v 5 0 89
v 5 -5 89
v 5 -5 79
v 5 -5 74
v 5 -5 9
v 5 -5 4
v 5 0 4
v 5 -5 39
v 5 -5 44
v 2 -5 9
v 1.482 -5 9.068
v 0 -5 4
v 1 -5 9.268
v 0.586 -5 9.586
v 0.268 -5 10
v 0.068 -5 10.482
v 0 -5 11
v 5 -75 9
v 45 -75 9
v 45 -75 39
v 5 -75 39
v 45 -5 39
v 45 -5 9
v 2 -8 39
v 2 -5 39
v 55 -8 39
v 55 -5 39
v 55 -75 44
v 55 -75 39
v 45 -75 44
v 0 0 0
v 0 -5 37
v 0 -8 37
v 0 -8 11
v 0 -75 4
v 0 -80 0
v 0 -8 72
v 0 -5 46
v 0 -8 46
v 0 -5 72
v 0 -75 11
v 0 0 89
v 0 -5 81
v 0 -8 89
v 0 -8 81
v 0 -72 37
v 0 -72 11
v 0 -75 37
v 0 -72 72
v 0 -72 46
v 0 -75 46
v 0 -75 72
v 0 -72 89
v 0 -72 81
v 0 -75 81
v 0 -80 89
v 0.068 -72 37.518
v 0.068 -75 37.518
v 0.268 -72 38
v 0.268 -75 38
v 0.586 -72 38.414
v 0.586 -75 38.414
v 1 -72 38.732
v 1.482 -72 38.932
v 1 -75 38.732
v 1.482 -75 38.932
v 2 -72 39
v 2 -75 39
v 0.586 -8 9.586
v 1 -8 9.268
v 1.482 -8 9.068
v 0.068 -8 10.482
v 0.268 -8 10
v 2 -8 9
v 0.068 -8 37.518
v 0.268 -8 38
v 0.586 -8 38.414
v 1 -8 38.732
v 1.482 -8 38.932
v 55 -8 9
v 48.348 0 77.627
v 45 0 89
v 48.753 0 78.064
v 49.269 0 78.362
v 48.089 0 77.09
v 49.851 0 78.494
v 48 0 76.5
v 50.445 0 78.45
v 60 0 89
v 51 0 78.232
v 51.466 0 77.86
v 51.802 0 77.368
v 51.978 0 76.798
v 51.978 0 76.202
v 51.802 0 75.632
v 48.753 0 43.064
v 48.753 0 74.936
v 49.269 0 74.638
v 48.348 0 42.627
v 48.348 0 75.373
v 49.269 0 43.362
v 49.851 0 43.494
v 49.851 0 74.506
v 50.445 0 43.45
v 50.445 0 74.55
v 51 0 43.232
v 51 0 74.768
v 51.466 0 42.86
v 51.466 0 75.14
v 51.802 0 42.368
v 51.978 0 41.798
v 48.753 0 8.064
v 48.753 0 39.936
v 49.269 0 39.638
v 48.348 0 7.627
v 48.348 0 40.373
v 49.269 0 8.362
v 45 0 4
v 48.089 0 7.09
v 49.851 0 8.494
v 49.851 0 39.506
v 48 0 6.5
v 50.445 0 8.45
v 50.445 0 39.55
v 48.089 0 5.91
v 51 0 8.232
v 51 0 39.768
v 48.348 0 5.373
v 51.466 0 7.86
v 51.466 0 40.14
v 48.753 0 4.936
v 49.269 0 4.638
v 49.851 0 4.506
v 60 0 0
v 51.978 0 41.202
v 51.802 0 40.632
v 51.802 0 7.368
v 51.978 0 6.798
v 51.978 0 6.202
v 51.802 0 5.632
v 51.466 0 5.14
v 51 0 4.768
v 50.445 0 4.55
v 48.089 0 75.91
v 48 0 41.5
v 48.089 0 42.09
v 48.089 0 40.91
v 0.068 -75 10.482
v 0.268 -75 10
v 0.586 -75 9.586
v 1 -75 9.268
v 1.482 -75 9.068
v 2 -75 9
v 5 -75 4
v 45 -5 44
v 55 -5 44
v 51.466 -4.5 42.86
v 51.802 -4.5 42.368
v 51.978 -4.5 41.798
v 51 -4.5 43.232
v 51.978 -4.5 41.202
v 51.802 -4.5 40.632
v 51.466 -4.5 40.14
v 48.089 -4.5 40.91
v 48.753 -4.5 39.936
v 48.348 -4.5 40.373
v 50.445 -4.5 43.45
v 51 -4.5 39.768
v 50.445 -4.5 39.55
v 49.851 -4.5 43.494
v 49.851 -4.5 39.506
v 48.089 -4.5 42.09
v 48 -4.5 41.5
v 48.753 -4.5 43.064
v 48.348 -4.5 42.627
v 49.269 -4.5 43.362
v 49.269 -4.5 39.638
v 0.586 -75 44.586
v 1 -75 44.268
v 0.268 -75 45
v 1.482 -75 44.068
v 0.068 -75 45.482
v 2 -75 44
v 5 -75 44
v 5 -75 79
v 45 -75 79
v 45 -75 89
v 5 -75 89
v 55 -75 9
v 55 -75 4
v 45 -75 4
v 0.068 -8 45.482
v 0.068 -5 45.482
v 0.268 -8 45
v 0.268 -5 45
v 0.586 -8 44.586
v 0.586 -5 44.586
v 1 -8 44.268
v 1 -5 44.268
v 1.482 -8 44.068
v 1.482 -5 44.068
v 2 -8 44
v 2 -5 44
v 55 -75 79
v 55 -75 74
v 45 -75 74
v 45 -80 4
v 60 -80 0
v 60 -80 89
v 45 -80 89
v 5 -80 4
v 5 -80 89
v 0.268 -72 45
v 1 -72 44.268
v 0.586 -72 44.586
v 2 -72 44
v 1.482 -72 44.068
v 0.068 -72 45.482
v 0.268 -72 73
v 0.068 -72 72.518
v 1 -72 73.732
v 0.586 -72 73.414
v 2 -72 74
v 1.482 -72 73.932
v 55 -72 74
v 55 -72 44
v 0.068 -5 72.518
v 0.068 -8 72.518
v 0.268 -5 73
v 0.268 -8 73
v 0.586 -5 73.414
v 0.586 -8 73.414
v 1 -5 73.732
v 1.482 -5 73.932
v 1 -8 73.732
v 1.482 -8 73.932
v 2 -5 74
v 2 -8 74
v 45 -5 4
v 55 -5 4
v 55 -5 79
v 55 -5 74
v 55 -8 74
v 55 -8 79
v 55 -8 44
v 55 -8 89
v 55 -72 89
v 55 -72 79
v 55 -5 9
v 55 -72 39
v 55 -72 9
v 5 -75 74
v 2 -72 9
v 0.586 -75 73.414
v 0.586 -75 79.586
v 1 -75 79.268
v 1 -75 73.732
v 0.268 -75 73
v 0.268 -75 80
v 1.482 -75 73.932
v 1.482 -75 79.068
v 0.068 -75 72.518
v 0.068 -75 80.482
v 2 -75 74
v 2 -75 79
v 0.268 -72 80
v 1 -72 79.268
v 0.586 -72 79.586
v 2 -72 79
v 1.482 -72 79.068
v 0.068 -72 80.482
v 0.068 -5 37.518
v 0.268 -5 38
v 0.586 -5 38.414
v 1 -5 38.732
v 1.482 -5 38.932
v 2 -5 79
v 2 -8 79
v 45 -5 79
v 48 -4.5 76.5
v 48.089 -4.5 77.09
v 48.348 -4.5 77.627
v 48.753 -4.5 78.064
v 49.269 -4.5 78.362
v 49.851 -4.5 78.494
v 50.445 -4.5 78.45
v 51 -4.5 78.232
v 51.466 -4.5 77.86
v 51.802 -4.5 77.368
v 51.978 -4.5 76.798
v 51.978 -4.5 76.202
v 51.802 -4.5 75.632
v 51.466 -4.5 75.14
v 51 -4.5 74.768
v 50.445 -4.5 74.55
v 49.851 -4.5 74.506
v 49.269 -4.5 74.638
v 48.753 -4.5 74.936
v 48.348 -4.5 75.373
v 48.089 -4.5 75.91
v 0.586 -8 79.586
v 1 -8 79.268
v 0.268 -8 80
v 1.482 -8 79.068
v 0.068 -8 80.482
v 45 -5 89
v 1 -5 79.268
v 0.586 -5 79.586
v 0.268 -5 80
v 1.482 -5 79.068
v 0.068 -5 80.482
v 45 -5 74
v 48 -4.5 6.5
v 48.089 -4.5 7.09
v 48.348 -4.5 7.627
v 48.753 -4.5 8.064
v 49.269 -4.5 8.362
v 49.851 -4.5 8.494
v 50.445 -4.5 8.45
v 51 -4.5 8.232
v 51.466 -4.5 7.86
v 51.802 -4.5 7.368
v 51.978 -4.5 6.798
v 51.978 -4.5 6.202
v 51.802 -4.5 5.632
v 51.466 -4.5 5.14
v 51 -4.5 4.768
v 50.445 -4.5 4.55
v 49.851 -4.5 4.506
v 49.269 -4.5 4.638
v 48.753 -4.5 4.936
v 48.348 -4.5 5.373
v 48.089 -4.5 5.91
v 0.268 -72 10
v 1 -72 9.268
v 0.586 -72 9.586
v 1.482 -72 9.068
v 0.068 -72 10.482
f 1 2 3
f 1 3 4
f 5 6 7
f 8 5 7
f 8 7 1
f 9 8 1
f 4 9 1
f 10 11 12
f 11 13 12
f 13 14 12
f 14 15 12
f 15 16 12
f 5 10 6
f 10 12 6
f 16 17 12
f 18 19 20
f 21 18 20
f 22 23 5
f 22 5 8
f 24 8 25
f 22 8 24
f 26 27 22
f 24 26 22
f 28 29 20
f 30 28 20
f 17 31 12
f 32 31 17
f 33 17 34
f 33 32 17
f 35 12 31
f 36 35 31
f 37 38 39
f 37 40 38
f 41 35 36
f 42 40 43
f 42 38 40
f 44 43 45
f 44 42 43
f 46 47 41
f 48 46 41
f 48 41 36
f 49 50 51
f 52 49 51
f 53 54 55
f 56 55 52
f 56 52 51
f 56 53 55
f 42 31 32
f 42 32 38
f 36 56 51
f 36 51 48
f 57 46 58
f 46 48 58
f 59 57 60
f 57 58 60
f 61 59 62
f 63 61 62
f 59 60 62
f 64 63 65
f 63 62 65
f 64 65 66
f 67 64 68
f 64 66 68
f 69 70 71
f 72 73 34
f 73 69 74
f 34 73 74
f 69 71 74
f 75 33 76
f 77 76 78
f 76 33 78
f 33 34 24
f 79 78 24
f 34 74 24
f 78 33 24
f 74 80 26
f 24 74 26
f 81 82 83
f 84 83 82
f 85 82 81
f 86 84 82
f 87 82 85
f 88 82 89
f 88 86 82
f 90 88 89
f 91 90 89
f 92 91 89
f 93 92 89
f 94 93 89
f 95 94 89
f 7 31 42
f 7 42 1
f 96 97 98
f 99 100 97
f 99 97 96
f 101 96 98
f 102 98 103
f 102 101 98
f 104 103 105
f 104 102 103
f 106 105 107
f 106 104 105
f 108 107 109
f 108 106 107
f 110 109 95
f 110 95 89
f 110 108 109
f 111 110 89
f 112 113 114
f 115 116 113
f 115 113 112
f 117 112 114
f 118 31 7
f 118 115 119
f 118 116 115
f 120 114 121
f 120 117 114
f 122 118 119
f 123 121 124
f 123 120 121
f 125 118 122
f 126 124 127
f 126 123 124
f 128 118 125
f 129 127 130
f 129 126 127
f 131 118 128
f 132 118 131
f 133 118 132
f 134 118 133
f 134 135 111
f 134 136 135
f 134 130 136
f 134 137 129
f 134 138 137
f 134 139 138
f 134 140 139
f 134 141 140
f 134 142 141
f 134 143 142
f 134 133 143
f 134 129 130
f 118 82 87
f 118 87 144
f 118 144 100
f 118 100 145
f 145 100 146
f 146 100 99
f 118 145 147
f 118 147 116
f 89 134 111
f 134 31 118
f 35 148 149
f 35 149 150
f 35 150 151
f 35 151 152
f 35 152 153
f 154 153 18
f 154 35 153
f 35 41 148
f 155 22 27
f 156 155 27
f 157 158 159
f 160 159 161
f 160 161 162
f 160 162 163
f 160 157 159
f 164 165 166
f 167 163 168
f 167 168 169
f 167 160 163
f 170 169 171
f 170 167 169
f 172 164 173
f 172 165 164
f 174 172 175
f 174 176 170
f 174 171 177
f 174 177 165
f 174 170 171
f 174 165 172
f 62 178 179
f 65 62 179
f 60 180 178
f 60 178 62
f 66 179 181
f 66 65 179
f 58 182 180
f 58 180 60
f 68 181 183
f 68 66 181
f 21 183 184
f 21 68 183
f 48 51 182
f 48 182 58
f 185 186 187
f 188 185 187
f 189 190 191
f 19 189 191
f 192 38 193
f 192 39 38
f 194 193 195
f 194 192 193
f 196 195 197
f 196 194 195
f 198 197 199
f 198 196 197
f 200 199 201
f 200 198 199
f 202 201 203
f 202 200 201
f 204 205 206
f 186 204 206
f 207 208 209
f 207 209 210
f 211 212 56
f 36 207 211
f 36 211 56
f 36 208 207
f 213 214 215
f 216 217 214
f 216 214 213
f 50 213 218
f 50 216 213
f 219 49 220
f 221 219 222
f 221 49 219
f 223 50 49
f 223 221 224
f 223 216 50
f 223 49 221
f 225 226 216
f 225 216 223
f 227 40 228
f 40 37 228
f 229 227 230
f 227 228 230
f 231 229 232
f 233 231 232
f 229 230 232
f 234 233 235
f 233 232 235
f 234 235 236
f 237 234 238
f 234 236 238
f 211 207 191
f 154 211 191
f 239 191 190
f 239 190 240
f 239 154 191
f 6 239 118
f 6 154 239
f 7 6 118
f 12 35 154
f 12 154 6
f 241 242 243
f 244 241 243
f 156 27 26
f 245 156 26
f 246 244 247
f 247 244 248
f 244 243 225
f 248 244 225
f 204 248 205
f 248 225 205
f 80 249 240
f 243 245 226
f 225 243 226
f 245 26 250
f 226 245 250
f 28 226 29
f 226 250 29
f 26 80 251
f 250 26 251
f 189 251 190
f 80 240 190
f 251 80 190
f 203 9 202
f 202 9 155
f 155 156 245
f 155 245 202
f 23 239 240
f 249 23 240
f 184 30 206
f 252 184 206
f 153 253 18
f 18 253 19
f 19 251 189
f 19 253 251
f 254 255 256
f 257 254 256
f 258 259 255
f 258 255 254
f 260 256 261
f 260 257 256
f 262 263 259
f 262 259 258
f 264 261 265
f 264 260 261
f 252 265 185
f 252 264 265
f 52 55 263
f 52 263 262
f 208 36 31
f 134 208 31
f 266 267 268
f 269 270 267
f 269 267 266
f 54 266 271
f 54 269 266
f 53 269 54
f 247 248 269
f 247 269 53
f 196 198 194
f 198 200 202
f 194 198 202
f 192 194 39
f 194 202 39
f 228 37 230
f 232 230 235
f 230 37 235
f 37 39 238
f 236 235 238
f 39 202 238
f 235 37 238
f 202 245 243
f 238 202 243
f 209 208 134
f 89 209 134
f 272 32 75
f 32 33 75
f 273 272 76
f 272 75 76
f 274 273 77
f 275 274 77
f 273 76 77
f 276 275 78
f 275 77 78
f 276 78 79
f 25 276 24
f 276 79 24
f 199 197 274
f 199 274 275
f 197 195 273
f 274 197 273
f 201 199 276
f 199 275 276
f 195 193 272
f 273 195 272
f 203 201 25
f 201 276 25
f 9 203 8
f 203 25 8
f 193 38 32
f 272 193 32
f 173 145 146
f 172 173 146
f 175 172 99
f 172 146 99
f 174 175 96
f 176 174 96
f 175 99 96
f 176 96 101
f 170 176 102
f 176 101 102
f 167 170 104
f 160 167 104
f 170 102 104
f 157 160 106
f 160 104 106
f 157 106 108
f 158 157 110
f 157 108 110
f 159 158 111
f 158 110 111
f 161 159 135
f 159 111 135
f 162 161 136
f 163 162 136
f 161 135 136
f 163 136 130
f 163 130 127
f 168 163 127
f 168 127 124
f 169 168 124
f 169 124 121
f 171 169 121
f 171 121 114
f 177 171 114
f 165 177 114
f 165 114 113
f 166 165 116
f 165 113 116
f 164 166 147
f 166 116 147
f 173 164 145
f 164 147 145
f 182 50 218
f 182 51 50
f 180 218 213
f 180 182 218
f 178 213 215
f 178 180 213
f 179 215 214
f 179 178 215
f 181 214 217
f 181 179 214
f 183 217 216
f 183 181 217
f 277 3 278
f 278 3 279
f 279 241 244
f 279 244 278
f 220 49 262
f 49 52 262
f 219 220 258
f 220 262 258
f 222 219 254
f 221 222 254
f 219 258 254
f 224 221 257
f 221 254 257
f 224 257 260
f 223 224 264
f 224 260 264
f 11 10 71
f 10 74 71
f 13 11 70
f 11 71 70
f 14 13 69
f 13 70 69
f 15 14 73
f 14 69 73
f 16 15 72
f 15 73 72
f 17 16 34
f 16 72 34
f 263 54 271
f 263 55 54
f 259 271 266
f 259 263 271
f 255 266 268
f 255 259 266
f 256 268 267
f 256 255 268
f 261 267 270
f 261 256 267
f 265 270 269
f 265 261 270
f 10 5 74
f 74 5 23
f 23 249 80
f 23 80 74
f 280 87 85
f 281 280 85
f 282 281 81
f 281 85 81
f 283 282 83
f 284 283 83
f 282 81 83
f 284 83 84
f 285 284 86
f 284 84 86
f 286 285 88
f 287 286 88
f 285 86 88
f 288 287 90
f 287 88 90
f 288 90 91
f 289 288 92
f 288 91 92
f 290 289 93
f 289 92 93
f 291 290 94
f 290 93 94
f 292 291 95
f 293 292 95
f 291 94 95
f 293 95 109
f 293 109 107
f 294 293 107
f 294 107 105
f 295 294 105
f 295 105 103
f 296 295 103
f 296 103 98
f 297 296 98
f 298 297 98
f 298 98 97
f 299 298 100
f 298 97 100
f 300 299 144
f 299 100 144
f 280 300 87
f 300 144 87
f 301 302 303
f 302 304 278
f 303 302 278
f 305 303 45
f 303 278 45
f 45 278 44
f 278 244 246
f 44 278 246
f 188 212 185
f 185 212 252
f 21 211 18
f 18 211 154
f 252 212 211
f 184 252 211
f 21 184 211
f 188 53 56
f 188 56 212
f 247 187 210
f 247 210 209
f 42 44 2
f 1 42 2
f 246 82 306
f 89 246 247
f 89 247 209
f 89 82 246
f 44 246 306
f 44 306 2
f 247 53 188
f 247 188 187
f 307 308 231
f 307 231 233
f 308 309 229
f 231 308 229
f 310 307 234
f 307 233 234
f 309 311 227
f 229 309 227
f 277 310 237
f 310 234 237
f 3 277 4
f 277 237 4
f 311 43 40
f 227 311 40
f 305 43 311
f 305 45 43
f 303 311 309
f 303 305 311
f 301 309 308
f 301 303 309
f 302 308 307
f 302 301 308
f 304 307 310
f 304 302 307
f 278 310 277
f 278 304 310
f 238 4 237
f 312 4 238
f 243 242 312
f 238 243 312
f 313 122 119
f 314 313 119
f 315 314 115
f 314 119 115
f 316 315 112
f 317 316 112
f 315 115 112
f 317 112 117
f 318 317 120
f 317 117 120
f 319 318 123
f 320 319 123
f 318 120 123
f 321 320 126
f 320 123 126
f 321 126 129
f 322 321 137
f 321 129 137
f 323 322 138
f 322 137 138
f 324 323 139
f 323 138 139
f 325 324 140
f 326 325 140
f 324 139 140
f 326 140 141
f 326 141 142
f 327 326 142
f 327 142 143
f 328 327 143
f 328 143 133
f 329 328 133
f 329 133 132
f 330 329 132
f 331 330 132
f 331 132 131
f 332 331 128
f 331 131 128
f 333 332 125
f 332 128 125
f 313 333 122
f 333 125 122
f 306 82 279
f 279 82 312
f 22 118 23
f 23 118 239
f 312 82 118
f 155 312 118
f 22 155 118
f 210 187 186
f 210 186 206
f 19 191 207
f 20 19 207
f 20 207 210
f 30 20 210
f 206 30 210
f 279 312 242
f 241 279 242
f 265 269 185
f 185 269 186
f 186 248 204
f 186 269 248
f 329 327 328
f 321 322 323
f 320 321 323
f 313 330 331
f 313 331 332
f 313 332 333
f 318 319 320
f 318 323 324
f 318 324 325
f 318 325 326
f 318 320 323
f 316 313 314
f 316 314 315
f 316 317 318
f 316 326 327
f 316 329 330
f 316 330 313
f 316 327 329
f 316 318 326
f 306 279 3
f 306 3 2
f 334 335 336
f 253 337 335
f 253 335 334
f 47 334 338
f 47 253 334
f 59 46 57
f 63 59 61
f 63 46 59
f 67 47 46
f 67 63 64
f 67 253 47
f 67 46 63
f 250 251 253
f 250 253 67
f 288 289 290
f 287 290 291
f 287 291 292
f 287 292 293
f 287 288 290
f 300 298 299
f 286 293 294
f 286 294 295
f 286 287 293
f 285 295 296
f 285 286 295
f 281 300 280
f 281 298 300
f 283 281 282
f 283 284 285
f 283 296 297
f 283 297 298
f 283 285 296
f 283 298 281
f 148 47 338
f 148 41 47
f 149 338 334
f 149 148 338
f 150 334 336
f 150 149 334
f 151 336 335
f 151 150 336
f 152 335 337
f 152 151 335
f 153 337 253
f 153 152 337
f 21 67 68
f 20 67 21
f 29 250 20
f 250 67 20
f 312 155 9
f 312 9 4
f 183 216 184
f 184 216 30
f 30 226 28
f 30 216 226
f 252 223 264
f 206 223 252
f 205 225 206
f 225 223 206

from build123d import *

# Parameters (mm, degrees)
SKETCH1_W           = 80
SKETCH1_H           = 60
BOSS_EXTRUDE1_DEPTH = 4
SKETCH3_W           = 5
SKETCH3_H           = 5
BOSS_EXTRUDE2_DEPTH = 85
SKETCH9_W           = 3
SKETCH9_H           = 30
SKETCH9_H_2         = 10
BOSS_EXTRUDE4_DEPTH = 55
FILLET2_R           = 2
SKETCH11_R          = 2
CUT_EXTRUDE2_DEPTH  = 4.5


with BuildPart() as part:
    # Sketch1 → Boss-Extrude1 (new body)
    with BuildSketch(Plane(origin=(0, 0, 0), x_dir=(0, 1, 0), z_dir=(0, 0, 1))):
        with Locations((-40, -30)):
            Rectangle(SKETCH1_W, SKETCH1_H)
    extrude(amount=BOSS_EXTRUDE1_DEPTH)

    # Sketch3 → Boss-Extrude2 (add)
    with BuildSketch(Plane.XY.offset(4)):
        with Locations((2.5, -2.5)):
            Rectangle(SKETCH3_W, SKETCH3_H)
        with Locations((2.5, -77.5)):
            Rectangle(SKETCH3_W, SKETCH3_H)
        Polygon((60, 0), (55, 0), (45, 0), (45, -5), (55, -5), (55, -75), (45, -75), (45, -80), (52.705337411, -80), (60, -80), align=None)
    extrude(amount=BOSS_EXTRUDE2_DEPTH)

    # Sketch9 → Boss-Extrude4 (add)
    with BuildSketch(Plane(origin=(55, 0, 0), x_dir=(0, -1, 0), z_dir=(-1, 0, 0))):
        with Locations((6.5, 24)):
            Rectangle(SKETCH9_W, SKETCH9_H)
        with Locations((6.5, 59)):
            Rectangle(SKETCH9_W, SKETCH9_H)
        with Locations((6.5, 84)):
            Rectangle(SKETCH9_W, SKETCH9_H_2)
        with Locations((73.5, 24)):
            Rectangle(SKETCH9_W, SKETCH9_H)
        with Locations((73.5, 59)):
            Rectangle(SKETCH9_W, SKETCH9_H)
        with Locations((73.5, 84)):
            Rectangle(SKETCH9_W, SKETCH9_H_2)
    extrude(amount=BOSS_EXTRUDE4_DEPTH)

    # Fillet2
    fillet2_edges = [part.edges().sort_by_distance(p)[0] for p in [
        (0, -6.5, 79),
        (0, -73.5, 39),
        (0, -73.5, 9),
        (0, -73.5, 74),
        (0, -73.5, 44),
        (0, -73.5, 79),
        (0, -6.5, 9),
        (0, -6.5, 39),
        (0, -6.5, 44),
        (0, -6.5, 74),
    ]]
    fillet(fillet2_edges, radius=FILLET2_R)

    # Sketch11 → Cut-Extrude2 (cut)
    with BuildSketch(Plane(origin=(0, 0, 0), x_dir=(-1, 0, 0), z_dir=(0, 1, 0))):
        with Locations((-50, 76.5)):
            Circle(SKETCH11_R)
        with Locations((-50, 41.5)):
            Circle(SKETCH11_R)
        with Locations((-50, 6.5)):
            Circle(SKETCH11_R)
    extrude(amount=-CUT_EXTRUDE2_DEPTH, mode=Mode.SUBTRACT)


solid = part.part
